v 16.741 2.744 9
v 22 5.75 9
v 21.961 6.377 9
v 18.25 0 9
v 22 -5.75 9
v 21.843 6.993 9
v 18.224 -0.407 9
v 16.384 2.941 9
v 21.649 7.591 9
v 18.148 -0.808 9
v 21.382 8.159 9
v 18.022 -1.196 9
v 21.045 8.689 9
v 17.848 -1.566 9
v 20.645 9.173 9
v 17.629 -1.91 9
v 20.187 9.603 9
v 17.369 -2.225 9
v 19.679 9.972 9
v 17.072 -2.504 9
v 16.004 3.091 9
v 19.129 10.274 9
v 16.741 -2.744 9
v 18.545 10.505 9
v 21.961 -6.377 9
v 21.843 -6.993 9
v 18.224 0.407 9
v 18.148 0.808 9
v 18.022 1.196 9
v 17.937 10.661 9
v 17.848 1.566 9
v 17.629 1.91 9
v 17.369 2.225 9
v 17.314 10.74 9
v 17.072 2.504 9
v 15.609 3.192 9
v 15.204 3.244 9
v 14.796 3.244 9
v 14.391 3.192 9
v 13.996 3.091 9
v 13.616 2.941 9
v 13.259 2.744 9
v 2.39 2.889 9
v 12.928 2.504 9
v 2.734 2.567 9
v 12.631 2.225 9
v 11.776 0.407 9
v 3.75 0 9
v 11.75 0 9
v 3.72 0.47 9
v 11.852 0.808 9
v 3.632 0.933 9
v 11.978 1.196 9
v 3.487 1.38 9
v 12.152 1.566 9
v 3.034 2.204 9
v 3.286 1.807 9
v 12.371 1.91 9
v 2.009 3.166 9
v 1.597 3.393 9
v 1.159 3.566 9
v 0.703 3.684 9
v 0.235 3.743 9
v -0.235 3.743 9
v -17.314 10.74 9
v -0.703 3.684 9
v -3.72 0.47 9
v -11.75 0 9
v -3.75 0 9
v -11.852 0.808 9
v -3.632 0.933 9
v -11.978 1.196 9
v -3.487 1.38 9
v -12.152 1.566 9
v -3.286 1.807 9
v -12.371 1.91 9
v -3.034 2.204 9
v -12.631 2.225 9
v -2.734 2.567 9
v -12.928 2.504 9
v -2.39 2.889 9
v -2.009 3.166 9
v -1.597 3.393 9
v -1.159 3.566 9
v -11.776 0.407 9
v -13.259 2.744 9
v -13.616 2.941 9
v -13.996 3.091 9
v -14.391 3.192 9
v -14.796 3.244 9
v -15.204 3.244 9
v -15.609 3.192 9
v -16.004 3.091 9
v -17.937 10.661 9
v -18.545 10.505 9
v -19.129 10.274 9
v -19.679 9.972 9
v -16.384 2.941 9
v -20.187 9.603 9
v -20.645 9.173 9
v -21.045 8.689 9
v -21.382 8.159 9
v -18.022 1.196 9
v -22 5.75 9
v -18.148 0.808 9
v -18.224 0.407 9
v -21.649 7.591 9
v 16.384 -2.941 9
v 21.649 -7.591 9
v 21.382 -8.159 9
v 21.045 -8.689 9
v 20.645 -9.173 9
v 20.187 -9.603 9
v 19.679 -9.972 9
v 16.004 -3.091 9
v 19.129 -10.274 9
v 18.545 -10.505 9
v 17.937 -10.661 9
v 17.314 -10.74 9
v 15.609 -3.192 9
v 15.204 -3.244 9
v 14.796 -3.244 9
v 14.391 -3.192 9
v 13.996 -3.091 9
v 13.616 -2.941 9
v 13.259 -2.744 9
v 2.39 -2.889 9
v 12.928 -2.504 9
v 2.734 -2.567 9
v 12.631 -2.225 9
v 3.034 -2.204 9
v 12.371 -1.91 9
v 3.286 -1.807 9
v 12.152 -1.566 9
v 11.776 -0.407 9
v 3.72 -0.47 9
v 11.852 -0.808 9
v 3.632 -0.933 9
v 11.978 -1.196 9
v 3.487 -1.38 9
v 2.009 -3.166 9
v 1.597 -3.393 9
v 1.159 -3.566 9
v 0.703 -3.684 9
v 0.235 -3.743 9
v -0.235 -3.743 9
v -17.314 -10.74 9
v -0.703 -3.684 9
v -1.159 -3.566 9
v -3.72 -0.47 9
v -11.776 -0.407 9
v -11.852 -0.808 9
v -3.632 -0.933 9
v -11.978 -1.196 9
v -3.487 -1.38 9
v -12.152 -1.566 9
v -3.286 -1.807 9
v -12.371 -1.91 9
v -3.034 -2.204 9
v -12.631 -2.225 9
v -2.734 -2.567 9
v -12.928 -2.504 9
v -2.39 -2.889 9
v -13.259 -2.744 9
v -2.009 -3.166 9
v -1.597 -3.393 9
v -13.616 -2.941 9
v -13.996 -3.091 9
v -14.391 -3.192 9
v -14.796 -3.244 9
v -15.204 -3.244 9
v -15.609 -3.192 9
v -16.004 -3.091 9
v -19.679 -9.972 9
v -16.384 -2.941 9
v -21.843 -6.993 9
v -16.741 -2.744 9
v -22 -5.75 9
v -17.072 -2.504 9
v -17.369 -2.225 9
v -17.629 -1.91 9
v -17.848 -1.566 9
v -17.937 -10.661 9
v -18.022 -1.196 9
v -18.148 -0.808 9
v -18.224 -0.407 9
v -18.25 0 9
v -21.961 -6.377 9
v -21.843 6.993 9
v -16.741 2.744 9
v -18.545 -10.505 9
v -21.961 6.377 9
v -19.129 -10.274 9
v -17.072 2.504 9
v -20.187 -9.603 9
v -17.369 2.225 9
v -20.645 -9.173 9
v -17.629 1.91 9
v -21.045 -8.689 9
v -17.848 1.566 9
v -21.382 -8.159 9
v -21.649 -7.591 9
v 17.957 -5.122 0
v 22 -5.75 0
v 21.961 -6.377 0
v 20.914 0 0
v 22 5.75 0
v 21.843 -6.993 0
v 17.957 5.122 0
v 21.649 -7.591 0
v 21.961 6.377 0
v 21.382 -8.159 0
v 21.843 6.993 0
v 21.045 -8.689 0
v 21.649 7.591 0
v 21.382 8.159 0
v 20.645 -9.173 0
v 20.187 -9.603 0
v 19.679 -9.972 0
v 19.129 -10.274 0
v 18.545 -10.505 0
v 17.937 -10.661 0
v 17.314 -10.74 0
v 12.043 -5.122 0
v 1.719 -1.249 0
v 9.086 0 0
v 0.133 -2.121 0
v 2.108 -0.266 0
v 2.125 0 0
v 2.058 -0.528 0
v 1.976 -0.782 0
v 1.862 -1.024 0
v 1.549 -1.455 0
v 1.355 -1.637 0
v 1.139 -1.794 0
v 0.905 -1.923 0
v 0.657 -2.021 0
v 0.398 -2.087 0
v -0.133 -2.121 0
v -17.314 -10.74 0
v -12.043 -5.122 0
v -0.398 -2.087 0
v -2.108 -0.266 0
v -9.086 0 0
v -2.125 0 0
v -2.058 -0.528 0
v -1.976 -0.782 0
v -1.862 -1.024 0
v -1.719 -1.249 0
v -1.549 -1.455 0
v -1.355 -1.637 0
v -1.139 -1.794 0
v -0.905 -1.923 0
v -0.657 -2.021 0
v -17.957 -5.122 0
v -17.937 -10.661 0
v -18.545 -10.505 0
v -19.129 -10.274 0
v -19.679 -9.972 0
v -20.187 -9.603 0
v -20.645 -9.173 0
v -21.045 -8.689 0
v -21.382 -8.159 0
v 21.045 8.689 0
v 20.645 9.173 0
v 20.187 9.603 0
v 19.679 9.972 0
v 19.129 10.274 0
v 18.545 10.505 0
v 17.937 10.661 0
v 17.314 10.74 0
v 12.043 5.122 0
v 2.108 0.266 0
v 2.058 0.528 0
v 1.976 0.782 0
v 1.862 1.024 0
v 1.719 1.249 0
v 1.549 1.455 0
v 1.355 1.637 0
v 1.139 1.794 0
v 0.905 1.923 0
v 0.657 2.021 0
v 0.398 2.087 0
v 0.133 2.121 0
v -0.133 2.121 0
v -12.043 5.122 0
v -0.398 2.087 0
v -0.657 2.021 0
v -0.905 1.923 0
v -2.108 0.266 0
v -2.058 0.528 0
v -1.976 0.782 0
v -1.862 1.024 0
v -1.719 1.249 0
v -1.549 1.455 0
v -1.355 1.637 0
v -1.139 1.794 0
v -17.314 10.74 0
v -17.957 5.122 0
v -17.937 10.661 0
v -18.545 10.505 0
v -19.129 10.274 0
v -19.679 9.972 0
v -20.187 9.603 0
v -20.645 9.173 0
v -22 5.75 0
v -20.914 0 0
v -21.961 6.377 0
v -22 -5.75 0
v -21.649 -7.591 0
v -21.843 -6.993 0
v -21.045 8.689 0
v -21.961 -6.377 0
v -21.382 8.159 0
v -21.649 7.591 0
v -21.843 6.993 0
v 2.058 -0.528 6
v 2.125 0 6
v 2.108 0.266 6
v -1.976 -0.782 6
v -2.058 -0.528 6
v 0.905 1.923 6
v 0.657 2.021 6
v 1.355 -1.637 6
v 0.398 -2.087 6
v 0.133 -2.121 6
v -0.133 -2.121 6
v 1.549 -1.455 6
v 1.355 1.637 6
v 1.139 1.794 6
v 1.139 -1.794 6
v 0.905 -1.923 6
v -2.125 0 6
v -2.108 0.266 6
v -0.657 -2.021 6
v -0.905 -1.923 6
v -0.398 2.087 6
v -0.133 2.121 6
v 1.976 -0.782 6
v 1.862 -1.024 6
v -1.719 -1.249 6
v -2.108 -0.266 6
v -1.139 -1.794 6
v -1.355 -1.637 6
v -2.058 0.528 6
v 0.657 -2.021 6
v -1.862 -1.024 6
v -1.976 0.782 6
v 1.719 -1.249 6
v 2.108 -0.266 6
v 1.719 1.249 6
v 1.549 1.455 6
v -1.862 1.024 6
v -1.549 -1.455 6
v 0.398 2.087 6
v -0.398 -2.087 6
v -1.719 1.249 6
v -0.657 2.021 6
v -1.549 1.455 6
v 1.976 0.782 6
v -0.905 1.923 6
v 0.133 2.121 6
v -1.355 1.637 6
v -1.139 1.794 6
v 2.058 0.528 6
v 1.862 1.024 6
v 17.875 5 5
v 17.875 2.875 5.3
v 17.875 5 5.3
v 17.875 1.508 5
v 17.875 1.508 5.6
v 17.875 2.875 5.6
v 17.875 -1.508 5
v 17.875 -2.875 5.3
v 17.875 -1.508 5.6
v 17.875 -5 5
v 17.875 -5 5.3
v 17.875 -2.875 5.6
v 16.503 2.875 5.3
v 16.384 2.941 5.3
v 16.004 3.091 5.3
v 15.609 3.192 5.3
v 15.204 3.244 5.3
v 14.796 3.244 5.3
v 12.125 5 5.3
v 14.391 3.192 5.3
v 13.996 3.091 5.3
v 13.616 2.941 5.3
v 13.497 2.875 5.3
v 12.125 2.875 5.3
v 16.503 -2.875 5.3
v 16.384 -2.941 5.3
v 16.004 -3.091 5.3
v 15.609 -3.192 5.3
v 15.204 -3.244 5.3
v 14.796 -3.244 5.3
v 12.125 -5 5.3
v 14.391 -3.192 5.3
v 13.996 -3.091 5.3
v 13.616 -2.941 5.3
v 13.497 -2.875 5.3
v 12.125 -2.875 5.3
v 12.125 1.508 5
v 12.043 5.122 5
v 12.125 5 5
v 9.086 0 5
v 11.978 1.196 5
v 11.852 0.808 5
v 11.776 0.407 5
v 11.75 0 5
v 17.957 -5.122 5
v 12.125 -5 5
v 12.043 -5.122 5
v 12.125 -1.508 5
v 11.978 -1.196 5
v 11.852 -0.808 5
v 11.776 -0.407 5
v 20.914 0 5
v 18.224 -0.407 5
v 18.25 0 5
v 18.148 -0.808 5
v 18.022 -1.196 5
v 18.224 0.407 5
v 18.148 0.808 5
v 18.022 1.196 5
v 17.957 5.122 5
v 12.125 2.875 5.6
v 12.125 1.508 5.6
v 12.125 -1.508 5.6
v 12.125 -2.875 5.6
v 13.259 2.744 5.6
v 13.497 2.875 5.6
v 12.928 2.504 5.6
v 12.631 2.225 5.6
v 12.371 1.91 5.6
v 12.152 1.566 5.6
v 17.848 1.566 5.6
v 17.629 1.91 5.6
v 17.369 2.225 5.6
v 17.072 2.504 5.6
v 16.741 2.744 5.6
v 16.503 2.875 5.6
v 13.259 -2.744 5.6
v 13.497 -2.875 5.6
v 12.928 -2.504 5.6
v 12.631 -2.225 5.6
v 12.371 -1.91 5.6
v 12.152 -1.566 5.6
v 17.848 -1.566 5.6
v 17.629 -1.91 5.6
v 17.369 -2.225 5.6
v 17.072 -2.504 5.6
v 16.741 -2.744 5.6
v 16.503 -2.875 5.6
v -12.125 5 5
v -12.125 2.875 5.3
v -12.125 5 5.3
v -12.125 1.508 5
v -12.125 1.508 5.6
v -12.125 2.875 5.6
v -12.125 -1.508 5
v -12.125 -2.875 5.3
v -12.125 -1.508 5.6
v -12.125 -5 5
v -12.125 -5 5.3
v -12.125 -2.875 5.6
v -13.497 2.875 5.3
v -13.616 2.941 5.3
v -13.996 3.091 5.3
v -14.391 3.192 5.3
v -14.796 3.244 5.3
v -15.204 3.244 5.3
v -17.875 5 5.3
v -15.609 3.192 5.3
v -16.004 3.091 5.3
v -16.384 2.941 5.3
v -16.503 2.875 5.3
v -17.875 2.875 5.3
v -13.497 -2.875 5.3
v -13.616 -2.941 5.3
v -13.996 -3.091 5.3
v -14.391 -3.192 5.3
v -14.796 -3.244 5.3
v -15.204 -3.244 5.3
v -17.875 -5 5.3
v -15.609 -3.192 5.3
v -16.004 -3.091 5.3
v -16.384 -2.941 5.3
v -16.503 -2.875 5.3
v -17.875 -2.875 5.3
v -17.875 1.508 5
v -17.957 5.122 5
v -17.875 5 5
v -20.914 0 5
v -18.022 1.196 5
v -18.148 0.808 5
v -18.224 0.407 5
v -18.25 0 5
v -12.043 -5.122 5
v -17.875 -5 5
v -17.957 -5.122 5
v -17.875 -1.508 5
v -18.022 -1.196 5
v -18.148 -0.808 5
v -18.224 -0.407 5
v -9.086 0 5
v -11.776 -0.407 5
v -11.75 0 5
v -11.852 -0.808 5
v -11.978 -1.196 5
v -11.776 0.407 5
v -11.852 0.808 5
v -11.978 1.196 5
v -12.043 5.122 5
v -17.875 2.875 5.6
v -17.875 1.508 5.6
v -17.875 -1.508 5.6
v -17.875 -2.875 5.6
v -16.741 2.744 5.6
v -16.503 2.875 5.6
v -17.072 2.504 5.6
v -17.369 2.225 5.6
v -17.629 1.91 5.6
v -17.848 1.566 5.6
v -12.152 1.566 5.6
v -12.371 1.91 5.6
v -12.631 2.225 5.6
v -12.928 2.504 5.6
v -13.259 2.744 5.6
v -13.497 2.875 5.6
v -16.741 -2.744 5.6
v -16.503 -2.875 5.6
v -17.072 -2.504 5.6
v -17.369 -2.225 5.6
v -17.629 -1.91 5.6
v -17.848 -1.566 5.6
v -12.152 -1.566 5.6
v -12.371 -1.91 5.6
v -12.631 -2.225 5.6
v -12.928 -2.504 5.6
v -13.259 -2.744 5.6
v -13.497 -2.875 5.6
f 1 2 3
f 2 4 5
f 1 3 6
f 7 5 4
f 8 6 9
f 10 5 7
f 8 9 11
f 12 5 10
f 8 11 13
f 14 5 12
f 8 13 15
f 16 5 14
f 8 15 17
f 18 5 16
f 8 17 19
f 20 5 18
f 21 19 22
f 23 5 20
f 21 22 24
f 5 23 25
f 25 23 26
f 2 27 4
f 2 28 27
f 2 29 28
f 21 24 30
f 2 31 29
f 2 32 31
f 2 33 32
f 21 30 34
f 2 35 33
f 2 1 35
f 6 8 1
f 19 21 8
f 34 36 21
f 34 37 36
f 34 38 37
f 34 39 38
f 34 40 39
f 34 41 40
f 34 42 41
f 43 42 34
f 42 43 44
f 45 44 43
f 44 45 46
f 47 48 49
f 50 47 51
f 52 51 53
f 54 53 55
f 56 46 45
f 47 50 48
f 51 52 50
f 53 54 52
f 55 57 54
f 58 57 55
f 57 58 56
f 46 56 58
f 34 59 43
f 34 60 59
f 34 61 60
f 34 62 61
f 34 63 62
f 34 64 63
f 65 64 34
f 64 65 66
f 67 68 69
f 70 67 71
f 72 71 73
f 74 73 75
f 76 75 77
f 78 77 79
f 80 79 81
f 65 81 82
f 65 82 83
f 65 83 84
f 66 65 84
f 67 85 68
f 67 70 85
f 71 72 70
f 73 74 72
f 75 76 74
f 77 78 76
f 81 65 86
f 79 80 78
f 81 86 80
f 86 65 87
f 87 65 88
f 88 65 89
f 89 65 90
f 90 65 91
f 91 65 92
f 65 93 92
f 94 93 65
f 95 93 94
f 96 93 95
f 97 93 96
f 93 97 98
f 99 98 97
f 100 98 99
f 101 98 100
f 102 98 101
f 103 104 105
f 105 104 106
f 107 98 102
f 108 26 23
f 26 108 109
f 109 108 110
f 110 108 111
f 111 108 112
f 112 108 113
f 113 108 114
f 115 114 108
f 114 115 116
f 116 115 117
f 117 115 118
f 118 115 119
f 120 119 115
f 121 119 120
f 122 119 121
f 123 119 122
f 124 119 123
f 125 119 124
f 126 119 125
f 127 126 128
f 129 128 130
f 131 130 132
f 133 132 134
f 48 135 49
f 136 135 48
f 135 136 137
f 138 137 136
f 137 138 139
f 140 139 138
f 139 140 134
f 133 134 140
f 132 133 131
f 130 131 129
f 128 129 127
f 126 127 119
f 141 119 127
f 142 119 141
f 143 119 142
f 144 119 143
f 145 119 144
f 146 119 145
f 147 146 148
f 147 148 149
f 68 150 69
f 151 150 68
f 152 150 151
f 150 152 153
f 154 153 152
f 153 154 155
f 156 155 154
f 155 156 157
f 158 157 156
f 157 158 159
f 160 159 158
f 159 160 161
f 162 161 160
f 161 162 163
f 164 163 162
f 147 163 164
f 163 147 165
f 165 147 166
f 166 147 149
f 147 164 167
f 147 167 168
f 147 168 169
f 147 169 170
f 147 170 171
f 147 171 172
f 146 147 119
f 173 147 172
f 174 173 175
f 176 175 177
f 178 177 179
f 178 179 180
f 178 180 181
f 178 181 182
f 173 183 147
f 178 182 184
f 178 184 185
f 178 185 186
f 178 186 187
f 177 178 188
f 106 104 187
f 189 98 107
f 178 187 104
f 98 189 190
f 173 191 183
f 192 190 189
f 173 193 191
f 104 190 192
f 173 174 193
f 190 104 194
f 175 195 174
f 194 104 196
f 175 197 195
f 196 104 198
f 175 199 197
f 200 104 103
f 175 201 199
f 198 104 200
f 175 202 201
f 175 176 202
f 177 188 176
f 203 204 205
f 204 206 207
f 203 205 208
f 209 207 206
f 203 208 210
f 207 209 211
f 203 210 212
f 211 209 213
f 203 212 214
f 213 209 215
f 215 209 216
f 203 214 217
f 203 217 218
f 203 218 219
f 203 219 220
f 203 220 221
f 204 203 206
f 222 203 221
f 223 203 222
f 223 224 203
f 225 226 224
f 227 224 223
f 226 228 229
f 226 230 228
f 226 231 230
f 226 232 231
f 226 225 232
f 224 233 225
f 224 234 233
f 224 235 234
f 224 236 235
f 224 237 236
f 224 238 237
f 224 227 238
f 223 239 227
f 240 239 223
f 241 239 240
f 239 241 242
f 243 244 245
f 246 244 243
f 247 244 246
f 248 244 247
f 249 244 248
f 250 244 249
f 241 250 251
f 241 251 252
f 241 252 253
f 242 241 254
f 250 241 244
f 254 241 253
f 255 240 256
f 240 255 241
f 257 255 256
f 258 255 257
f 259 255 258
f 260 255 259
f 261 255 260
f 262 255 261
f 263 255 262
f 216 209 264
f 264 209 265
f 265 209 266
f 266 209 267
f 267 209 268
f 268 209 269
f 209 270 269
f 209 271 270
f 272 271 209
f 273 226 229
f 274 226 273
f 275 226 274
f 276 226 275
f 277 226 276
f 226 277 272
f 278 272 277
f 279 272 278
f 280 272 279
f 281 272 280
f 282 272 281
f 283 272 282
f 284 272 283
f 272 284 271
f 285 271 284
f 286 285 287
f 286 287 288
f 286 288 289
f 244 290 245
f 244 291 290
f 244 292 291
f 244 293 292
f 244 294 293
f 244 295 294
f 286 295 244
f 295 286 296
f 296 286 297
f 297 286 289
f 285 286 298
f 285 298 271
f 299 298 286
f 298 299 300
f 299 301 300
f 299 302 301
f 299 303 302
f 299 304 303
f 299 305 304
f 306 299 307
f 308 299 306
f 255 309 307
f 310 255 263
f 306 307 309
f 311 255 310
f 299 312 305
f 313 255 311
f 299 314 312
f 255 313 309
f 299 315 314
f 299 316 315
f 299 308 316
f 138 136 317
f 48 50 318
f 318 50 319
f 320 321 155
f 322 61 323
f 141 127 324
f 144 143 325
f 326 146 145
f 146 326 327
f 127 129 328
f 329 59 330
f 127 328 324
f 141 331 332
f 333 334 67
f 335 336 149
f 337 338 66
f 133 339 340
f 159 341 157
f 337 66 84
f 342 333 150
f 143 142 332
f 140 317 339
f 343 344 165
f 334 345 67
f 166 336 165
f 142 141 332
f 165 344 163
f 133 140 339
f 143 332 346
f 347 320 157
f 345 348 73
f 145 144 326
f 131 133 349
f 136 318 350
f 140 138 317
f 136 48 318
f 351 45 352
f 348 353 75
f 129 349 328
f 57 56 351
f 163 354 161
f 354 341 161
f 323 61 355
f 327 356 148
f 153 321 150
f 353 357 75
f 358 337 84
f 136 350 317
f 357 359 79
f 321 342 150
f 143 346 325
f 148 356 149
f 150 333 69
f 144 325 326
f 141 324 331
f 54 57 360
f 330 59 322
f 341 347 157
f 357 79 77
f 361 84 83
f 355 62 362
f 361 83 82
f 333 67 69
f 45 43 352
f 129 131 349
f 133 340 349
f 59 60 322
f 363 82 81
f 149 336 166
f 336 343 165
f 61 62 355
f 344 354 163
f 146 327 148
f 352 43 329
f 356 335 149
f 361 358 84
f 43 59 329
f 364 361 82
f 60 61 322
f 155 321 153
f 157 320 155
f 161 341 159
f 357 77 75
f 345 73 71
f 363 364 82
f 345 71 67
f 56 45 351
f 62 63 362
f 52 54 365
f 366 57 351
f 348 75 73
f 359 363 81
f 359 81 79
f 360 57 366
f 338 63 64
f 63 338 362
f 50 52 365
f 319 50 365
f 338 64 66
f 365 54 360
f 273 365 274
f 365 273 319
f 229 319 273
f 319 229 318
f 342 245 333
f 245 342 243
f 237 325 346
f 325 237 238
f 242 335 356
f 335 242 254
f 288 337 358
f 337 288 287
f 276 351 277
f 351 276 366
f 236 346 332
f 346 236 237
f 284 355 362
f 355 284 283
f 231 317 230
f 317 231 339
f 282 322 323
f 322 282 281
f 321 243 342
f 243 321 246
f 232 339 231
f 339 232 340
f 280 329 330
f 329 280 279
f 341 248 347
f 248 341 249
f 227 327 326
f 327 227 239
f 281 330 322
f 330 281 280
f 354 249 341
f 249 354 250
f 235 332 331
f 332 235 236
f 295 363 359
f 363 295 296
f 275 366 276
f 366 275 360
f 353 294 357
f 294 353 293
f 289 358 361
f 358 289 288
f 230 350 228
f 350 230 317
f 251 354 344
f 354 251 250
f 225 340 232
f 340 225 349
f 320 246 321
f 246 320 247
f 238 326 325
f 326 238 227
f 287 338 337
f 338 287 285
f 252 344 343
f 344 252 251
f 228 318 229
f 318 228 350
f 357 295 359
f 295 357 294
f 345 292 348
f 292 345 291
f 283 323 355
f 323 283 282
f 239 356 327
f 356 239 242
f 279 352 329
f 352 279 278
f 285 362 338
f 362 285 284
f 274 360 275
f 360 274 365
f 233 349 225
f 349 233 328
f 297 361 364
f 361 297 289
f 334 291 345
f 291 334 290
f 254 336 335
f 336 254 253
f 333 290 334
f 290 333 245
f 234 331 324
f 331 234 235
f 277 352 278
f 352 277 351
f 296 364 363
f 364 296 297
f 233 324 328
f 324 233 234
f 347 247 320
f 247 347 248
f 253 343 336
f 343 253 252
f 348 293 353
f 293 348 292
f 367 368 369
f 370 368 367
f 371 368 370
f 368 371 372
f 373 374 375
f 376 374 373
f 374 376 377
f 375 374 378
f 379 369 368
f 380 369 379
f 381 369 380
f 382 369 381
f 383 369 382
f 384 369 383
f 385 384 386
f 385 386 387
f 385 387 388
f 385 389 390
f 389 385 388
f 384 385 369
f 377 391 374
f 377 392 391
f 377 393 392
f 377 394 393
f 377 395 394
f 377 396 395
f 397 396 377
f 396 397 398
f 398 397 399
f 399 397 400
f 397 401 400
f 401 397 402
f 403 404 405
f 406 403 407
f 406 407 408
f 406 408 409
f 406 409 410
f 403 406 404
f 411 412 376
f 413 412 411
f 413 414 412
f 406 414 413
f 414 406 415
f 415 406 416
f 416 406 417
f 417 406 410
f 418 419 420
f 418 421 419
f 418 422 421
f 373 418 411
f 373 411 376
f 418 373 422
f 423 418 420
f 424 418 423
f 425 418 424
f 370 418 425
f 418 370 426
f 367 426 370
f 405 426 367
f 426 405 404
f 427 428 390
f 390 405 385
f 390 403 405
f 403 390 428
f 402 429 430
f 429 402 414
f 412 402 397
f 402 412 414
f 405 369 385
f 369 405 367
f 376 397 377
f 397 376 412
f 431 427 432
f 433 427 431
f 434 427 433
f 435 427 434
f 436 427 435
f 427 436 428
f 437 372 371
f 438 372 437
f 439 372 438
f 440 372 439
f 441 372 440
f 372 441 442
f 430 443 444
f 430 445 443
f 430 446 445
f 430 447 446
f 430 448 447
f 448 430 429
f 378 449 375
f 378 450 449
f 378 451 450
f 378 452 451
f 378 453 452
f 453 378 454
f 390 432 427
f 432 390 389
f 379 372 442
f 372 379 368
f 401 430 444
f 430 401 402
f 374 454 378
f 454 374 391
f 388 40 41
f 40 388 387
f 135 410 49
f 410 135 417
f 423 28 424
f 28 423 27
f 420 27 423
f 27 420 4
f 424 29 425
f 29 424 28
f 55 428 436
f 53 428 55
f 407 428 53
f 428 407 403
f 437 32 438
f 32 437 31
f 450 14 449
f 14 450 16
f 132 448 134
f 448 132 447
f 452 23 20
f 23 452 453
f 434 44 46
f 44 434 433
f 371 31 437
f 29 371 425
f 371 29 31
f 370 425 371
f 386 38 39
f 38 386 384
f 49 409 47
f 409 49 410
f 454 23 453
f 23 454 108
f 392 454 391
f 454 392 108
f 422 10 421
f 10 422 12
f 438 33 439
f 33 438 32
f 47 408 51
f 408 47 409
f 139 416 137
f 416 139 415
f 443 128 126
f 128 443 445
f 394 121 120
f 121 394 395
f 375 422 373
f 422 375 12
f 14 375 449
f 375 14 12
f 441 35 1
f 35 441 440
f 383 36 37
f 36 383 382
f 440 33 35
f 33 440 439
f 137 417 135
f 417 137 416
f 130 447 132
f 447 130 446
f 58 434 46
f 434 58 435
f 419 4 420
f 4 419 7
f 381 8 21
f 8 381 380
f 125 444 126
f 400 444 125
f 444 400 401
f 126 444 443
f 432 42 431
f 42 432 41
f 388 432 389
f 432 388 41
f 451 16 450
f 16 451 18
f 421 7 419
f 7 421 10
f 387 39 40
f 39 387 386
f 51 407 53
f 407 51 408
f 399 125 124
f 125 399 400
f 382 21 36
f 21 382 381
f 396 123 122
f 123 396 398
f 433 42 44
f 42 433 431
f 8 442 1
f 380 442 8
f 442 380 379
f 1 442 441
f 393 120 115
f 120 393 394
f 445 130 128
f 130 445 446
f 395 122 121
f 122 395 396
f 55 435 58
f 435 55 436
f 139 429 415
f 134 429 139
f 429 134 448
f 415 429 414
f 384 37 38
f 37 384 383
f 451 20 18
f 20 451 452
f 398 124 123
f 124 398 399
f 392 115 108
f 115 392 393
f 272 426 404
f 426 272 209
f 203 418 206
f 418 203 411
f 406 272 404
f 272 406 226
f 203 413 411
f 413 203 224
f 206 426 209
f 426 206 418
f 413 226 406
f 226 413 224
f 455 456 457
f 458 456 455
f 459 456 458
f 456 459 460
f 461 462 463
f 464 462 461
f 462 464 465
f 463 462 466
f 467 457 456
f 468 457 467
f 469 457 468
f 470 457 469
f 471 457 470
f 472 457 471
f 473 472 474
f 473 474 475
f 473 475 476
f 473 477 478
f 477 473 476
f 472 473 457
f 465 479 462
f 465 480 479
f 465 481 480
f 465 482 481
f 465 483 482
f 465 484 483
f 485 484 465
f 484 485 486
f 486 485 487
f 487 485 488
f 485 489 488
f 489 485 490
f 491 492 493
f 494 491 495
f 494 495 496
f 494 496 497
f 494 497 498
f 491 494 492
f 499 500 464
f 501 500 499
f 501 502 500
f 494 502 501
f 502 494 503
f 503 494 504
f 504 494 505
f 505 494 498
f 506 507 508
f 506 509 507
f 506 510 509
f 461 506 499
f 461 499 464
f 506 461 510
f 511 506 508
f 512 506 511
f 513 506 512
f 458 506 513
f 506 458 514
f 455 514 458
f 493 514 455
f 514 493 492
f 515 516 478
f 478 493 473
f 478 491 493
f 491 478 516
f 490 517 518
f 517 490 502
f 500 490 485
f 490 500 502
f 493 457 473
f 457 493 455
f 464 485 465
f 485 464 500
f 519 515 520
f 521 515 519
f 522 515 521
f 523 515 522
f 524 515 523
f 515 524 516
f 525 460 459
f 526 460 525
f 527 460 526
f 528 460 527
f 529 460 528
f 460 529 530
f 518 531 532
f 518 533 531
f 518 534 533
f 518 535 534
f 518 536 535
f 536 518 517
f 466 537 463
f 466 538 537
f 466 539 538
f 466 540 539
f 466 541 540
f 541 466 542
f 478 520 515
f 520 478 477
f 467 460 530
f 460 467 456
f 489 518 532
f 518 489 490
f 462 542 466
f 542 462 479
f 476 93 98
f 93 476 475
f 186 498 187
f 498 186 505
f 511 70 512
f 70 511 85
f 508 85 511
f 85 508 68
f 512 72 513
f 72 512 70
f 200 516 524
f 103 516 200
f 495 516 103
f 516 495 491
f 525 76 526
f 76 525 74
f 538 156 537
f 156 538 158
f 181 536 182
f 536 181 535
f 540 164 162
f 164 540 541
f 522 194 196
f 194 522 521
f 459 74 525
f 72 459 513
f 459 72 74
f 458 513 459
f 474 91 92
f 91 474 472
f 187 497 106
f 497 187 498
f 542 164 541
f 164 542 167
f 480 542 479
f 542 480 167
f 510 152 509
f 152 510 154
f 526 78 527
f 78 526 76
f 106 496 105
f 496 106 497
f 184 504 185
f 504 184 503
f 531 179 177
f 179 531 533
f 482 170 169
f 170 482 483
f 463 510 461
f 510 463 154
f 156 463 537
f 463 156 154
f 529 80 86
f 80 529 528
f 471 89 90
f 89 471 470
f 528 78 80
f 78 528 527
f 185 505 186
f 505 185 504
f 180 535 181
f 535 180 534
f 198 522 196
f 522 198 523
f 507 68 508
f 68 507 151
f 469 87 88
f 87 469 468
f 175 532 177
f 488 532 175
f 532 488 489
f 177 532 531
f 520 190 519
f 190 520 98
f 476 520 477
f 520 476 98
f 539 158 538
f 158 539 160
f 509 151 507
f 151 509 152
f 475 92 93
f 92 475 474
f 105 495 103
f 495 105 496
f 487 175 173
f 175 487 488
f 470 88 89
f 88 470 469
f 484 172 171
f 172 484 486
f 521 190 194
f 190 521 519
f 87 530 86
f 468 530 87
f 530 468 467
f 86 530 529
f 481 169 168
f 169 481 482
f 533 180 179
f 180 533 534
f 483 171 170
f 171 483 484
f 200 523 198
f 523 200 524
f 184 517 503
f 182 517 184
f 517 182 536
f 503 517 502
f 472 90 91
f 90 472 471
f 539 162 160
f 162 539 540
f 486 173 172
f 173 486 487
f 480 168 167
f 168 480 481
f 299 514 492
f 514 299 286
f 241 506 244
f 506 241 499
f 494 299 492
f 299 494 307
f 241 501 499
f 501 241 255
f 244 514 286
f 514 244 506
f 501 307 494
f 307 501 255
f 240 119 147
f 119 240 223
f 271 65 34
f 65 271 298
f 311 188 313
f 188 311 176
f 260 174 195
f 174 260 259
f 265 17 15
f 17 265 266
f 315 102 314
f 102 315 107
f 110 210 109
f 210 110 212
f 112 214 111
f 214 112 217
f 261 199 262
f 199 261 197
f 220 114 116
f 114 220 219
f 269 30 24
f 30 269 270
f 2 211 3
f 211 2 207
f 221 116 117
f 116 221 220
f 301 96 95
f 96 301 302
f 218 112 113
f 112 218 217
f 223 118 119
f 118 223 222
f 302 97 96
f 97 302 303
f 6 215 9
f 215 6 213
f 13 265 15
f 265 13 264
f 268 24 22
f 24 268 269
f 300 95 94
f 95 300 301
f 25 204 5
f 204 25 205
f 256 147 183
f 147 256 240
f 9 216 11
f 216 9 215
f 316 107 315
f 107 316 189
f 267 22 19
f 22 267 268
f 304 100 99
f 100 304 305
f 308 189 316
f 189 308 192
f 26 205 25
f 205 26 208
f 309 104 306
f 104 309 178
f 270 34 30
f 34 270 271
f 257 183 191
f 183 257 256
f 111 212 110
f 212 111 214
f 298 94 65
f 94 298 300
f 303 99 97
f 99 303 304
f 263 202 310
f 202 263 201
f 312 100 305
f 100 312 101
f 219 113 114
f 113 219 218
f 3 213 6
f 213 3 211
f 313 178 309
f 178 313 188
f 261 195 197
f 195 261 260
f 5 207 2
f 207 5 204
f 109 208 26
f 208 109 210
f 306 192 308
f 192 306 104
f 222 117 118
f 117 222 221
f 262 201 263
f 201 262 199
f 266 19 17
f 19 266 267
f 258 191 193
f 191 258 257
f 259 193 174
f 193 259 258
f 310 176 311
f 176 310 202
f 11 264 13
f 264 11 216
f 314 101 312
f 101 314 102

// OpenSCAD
$fn = 50;


difference() {
	union() {
		hull() {
			translate(v = [-17.0000000000, 5.7500000000, 0]) {
				cylinder(h = 9, r = 5);
			}
			translate(v = [17.0000000000, 5.7500000000, 0]) {
				cylinder(h = 9, r = 5);
			}
			translate(v = [-17.0000000000, -5.7500000000, 0]) {
				cylinder(h = 9, r = 5);
			}
			translate(v = [17.0000000000, -5.7500000000, 0]) {
				cylinder(h = 9, r = 5);
			}
		}
	}
	union() {
		translate(v = [0, 0, 9]) {
			rotate(a = [0, 0, 0]) {
				difference() {
					union() {
						#translate(v = [0, 0, -9.0000000000]) {
							cylinder(h = 9, r = 2.0000000000);
						}
						#translate(v = [0, 0, -3]) {
							cylinder(h = 3, r1 = 2.1250000000, r2 = 3.7500000000);
						}
						#translate(v = [0, 0, -9.0000000000]) {
							cylinder(h = 9, r = 2.1250000000);
						}
						#translate(v = [0, 0, -9.0000000000]) {
							cylinder(h = 9, r = 2.0000000000);
						}
					}
					union();
				}
			}
		}
		translate(v = [15.0000000000, 0, 0]) {
			rotate(a = [0, 0, 0]) {
				difference() {
					union() {
						#translate(v = [-2.8750000000, -5.0000000000, -0.3000000000]) {
							cube(size = [5.7500000000, 10, 0.3000000000]);
						}
						#translate(v = [-2.8750000000, -2.8750000000, -0.6000000000]) {
							cube(size = [5.7500000000, 5.7500000000, 0.3000000000]);
						}
						#translate(v = [-2.8750000000, -5.0000000000, 5]) {
							cube(size = [5.7500000000, 10, 0.3000000000]);
						}
						#translate(v = [-2.8750000000, -2.8750000000, 5.3000000000]) {
							cube(size = [5.7500000000, 5.7500000000, 0.3000000000]);
						}
						#translate(v = [0, 0, -100.0000000000]) {
							cylinder(h = 200, r = 3.2500000000);
						}
						#linear_extrude(height = 5) {
							polygon(points = [[5.9142500000, 0.0000000000], [2.9571250000, 5.1218907443], [-2.9571250000, 5.1218907443], [-5.9142500000, 0.0000000000], [-2.9571250000, -5.1218907443], [2.9571250000, -5.1218907443]]);
						}
						#translate(v = [-2.8750000000, -5.0000000000, -0.3000000000]) {
							cube(size = [5.7500000000, 10, 0.3000000000]);
						}
						#translate(v = [-2.8750000000, -2.8750000000, -0.6000000000]) {
							cube(size = [5.7500000000, 5.7500000000, 0.3000000000]);
						}
						#translate(v = [-2.8750000000, -5.0000000000, 5]) {
							cube(size = [5.7500000000, 10, 0.3000000000]);
						}
						#translate(v = [-2.8750000000, -2.8750000000, 5.3000000000]) {
							cube(size = [5.7500000000, 5.7500000000, 0.3000000000]);
						}
						#translate(v = [0, 0, -100.0000000000]) {
							cylinder(h = 200, r = 3.2500000000);
						}
						#translate(v = [-2.8750000000, -5.0000000000, -0.3000000000]) {
							cube(size = [5.7500000000, 10, 0.3000000000]);
						}
						#translate(v = [-2.8750000000, -2.8750000000, -0.6000000000]) {
							cube(size = [5.7500000000, 5.7500000000, 0.3000000000]);
						}
						#translate(v = [-2.8750000000, -5.0000000000, 5]) {
							cube(size = [5.7500000000, 10, 0.3000000000]);
						}
						#translate(v = [-2.8750000000, -2.8750000000, 5.3000000000]) {
							cube(size = [5.7500000000, 5.7500000000, 0.3000000000]);
						}
						#translate(v = [0, 0, -100.0000000000]) {
							cylinder(h = 200, r = 3.2500000000);
						}
					}
					union();
				}
			}
		}
		translate(v = [-15.0000000000, 0, 0]) {
			rotate(a = [0, 0, 0]) {
				difference() {
					union() {
						#translate(v = [-2.8750000000, -5.0000000000, -0.3000000000]) {
							cube(size = [5.7500000000, 10, 0.3000000000]);
						}
						#translate(v = [-2.8750000000, -2.8750000000, -0.6000000000]) {
							cube(size = [5.7500000000, 5.7500000000, 0.3000000000]);
						}
						#translate(v = [-2.8750000000, -5.0000000000, 5]) {
							cube(size = [5.7500000000, 10, 0.3000000000]);
						}
						#translate(v = [-2.8750000000, -2.8750000000, 5.3000000000]) {
							cube(size = [5.7500000000, 5.7500000000, 0.3000000000]);
						}
						#translate(v = [0, 0, -100.0000000000]) {
							cylinder(h = 200, r = 3.2500000000);
						}
						#linear_extrude(height = 5) {
							polygon(points = [[5.9142500000, 0.0000000000], [2.9571250000, 5.1218907443], [-2.9571250000, 5.1218907443], [-5.9142500000, 0.0000000000], [-2.9571250000, -5.1218907443], [2.9571250000, -5.1218907443]]);
						}
						#translate(v = [-2.8750000000, -5.0000000000, -0.3000000000]) {
							cube(size = [5.7500000000, 10, 0.3000000000]);
						}
						#translate(v = [-2.8750000000, -2.8750000000, -0.6000000000]) {
							cube(size = [5.7500000000, 5.7500000000, 0.3000000000]);
						}
						#translate(v = [-2.8750000000, -5.0000000000, 5]) {
							cube(size = [5.7500000000, 10, 0.3000000000]);
						}
						#translate(v = [-2.8750000000, -2.8750000000, 5.3000000000]) {
							cube(size = [5.7500000000, 5.7500000000, 0.3000000000]);
						}
						#translate(v = [0, 0, -100.0000000000]) {
							cylinder(h = 200, r = 3.2500000000);
						}
						#translate(v = [-2.8750000000, -5.0000000000, -0.3000000000]) {
							cube(size = [5.7500000000, 10, 0.3000000000]);
						}
						#translate(v = [-2.8750000000, -2.8750000000, -0.6000000000]) {
							cube(size = [5.7500000000, 5.7500000000, 0.3000000000]);
						}
						#translate(v = [-2.8750000000, -5.0000000000, 5]) {
							cube(size = [5.7500000000, 10, 0.3000000000]);
						}
						#translate(v = [-2.8750000000, -2.8750000000, 5.3000000000]) {
							cube(size = [5.7500000000, 5.7500000000, 0.3000000000]);
						}
						#translate(v = [0, 0, -100.0000000000]) {
							cylinder(h = 200, r = 3.2500000000);
						}
					}
					union();
				}
			}
		}
	}
}
